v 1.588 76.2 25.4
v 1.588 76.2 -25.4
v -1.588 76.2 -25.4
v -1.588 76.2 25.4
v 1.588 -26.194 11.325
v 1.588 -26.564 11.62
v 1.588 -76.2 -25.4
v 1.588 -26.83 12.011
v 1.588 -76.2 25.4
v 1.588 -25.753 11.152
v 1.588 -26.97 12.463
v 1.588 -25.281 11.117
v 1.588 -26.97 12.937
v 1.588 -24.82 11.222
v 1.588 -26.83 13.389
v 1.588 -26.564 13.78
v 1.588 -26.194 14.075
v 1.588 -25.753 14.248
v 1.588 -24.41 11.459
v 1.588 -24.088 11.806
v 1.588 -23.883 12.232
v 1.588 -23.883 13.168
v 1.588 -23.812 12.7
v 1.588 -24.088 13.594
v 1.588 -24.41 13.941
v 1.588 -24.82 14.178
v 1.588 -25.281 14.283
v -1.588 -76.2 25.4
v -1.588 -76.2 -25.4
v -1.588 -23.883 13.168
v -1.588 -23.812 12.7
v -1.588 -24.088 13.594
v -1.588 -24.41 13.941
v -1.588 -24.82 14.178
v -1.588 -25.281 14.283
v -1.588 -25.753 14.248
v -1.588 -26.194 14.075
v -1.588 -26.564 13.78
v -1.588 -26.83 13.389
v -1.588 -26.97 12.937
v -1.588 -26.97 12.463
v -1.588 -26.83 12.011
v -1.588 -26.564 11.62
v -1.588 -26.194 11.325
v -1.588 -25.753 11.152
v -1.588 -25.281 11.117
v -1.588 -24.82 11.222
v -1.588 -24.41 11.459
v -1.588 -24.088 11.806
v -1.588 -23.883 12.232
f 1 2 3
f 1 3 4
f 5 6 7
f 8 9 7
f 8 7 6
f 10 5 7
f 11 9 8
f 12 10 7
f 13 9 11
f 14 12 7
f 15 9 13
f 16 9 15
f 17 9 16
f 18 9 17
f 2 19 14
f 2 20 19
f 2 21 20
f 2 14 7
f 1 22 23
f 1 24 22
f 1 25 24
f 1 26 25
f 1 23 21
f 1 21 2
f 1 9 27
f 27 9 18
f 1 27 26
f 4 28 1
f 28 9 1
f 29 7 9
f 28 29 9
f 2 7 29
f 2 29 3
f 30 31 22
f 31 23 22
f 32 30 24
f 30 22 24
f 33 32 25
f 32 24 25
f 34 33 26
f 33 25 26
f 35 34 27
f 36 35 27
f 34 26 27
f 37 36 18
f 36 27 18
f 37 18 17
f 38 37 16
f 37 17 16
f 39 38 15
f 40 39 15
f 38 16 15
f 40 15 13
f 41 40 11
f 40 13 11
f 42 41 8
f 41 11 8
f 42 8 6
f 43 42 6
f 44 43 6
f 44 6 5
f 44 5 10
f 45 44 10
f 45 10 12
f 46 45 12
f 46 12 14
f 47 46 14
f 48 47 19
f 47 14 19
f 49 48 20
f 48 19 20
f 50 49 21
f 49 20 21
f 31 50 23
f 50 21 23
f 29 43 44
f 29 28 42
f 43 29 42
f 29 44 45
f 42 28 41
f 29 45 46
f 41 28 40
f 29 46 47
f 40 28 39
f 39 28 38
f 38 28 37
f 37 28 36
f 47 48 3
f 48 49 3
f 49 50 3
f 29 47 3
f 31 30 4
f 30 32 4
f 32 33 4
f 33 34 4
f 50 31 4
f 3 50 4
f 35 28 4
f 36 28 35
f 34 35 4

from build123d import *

# Parameters (mm, degrees)
F0_W     = 152.4
F0_H     = 50.8
F2_DEPTH = 1.5875
F1_R     = 1.5875
F3_DEPTH = 1.5875


with BuildPart() as f2:
    # F0 (on Right) → F2 (new body, symmetric)
    with BuildSketch(Plane.YZ):
        Rectangle(F0_W, F0_H)
    extrude(amount=F2_DEPTH, both=True)

    # F1 (on Right) → F3 (cut, symmetric)
    with BuildSketch(Plane.YZ):
        with Locations((-25.4, 12.7)):
            Circle(F1_R)
    extrude(amount=F3_DEPTH, both=True, mode=Mode.SUBTRACT)


solid = f2.part
